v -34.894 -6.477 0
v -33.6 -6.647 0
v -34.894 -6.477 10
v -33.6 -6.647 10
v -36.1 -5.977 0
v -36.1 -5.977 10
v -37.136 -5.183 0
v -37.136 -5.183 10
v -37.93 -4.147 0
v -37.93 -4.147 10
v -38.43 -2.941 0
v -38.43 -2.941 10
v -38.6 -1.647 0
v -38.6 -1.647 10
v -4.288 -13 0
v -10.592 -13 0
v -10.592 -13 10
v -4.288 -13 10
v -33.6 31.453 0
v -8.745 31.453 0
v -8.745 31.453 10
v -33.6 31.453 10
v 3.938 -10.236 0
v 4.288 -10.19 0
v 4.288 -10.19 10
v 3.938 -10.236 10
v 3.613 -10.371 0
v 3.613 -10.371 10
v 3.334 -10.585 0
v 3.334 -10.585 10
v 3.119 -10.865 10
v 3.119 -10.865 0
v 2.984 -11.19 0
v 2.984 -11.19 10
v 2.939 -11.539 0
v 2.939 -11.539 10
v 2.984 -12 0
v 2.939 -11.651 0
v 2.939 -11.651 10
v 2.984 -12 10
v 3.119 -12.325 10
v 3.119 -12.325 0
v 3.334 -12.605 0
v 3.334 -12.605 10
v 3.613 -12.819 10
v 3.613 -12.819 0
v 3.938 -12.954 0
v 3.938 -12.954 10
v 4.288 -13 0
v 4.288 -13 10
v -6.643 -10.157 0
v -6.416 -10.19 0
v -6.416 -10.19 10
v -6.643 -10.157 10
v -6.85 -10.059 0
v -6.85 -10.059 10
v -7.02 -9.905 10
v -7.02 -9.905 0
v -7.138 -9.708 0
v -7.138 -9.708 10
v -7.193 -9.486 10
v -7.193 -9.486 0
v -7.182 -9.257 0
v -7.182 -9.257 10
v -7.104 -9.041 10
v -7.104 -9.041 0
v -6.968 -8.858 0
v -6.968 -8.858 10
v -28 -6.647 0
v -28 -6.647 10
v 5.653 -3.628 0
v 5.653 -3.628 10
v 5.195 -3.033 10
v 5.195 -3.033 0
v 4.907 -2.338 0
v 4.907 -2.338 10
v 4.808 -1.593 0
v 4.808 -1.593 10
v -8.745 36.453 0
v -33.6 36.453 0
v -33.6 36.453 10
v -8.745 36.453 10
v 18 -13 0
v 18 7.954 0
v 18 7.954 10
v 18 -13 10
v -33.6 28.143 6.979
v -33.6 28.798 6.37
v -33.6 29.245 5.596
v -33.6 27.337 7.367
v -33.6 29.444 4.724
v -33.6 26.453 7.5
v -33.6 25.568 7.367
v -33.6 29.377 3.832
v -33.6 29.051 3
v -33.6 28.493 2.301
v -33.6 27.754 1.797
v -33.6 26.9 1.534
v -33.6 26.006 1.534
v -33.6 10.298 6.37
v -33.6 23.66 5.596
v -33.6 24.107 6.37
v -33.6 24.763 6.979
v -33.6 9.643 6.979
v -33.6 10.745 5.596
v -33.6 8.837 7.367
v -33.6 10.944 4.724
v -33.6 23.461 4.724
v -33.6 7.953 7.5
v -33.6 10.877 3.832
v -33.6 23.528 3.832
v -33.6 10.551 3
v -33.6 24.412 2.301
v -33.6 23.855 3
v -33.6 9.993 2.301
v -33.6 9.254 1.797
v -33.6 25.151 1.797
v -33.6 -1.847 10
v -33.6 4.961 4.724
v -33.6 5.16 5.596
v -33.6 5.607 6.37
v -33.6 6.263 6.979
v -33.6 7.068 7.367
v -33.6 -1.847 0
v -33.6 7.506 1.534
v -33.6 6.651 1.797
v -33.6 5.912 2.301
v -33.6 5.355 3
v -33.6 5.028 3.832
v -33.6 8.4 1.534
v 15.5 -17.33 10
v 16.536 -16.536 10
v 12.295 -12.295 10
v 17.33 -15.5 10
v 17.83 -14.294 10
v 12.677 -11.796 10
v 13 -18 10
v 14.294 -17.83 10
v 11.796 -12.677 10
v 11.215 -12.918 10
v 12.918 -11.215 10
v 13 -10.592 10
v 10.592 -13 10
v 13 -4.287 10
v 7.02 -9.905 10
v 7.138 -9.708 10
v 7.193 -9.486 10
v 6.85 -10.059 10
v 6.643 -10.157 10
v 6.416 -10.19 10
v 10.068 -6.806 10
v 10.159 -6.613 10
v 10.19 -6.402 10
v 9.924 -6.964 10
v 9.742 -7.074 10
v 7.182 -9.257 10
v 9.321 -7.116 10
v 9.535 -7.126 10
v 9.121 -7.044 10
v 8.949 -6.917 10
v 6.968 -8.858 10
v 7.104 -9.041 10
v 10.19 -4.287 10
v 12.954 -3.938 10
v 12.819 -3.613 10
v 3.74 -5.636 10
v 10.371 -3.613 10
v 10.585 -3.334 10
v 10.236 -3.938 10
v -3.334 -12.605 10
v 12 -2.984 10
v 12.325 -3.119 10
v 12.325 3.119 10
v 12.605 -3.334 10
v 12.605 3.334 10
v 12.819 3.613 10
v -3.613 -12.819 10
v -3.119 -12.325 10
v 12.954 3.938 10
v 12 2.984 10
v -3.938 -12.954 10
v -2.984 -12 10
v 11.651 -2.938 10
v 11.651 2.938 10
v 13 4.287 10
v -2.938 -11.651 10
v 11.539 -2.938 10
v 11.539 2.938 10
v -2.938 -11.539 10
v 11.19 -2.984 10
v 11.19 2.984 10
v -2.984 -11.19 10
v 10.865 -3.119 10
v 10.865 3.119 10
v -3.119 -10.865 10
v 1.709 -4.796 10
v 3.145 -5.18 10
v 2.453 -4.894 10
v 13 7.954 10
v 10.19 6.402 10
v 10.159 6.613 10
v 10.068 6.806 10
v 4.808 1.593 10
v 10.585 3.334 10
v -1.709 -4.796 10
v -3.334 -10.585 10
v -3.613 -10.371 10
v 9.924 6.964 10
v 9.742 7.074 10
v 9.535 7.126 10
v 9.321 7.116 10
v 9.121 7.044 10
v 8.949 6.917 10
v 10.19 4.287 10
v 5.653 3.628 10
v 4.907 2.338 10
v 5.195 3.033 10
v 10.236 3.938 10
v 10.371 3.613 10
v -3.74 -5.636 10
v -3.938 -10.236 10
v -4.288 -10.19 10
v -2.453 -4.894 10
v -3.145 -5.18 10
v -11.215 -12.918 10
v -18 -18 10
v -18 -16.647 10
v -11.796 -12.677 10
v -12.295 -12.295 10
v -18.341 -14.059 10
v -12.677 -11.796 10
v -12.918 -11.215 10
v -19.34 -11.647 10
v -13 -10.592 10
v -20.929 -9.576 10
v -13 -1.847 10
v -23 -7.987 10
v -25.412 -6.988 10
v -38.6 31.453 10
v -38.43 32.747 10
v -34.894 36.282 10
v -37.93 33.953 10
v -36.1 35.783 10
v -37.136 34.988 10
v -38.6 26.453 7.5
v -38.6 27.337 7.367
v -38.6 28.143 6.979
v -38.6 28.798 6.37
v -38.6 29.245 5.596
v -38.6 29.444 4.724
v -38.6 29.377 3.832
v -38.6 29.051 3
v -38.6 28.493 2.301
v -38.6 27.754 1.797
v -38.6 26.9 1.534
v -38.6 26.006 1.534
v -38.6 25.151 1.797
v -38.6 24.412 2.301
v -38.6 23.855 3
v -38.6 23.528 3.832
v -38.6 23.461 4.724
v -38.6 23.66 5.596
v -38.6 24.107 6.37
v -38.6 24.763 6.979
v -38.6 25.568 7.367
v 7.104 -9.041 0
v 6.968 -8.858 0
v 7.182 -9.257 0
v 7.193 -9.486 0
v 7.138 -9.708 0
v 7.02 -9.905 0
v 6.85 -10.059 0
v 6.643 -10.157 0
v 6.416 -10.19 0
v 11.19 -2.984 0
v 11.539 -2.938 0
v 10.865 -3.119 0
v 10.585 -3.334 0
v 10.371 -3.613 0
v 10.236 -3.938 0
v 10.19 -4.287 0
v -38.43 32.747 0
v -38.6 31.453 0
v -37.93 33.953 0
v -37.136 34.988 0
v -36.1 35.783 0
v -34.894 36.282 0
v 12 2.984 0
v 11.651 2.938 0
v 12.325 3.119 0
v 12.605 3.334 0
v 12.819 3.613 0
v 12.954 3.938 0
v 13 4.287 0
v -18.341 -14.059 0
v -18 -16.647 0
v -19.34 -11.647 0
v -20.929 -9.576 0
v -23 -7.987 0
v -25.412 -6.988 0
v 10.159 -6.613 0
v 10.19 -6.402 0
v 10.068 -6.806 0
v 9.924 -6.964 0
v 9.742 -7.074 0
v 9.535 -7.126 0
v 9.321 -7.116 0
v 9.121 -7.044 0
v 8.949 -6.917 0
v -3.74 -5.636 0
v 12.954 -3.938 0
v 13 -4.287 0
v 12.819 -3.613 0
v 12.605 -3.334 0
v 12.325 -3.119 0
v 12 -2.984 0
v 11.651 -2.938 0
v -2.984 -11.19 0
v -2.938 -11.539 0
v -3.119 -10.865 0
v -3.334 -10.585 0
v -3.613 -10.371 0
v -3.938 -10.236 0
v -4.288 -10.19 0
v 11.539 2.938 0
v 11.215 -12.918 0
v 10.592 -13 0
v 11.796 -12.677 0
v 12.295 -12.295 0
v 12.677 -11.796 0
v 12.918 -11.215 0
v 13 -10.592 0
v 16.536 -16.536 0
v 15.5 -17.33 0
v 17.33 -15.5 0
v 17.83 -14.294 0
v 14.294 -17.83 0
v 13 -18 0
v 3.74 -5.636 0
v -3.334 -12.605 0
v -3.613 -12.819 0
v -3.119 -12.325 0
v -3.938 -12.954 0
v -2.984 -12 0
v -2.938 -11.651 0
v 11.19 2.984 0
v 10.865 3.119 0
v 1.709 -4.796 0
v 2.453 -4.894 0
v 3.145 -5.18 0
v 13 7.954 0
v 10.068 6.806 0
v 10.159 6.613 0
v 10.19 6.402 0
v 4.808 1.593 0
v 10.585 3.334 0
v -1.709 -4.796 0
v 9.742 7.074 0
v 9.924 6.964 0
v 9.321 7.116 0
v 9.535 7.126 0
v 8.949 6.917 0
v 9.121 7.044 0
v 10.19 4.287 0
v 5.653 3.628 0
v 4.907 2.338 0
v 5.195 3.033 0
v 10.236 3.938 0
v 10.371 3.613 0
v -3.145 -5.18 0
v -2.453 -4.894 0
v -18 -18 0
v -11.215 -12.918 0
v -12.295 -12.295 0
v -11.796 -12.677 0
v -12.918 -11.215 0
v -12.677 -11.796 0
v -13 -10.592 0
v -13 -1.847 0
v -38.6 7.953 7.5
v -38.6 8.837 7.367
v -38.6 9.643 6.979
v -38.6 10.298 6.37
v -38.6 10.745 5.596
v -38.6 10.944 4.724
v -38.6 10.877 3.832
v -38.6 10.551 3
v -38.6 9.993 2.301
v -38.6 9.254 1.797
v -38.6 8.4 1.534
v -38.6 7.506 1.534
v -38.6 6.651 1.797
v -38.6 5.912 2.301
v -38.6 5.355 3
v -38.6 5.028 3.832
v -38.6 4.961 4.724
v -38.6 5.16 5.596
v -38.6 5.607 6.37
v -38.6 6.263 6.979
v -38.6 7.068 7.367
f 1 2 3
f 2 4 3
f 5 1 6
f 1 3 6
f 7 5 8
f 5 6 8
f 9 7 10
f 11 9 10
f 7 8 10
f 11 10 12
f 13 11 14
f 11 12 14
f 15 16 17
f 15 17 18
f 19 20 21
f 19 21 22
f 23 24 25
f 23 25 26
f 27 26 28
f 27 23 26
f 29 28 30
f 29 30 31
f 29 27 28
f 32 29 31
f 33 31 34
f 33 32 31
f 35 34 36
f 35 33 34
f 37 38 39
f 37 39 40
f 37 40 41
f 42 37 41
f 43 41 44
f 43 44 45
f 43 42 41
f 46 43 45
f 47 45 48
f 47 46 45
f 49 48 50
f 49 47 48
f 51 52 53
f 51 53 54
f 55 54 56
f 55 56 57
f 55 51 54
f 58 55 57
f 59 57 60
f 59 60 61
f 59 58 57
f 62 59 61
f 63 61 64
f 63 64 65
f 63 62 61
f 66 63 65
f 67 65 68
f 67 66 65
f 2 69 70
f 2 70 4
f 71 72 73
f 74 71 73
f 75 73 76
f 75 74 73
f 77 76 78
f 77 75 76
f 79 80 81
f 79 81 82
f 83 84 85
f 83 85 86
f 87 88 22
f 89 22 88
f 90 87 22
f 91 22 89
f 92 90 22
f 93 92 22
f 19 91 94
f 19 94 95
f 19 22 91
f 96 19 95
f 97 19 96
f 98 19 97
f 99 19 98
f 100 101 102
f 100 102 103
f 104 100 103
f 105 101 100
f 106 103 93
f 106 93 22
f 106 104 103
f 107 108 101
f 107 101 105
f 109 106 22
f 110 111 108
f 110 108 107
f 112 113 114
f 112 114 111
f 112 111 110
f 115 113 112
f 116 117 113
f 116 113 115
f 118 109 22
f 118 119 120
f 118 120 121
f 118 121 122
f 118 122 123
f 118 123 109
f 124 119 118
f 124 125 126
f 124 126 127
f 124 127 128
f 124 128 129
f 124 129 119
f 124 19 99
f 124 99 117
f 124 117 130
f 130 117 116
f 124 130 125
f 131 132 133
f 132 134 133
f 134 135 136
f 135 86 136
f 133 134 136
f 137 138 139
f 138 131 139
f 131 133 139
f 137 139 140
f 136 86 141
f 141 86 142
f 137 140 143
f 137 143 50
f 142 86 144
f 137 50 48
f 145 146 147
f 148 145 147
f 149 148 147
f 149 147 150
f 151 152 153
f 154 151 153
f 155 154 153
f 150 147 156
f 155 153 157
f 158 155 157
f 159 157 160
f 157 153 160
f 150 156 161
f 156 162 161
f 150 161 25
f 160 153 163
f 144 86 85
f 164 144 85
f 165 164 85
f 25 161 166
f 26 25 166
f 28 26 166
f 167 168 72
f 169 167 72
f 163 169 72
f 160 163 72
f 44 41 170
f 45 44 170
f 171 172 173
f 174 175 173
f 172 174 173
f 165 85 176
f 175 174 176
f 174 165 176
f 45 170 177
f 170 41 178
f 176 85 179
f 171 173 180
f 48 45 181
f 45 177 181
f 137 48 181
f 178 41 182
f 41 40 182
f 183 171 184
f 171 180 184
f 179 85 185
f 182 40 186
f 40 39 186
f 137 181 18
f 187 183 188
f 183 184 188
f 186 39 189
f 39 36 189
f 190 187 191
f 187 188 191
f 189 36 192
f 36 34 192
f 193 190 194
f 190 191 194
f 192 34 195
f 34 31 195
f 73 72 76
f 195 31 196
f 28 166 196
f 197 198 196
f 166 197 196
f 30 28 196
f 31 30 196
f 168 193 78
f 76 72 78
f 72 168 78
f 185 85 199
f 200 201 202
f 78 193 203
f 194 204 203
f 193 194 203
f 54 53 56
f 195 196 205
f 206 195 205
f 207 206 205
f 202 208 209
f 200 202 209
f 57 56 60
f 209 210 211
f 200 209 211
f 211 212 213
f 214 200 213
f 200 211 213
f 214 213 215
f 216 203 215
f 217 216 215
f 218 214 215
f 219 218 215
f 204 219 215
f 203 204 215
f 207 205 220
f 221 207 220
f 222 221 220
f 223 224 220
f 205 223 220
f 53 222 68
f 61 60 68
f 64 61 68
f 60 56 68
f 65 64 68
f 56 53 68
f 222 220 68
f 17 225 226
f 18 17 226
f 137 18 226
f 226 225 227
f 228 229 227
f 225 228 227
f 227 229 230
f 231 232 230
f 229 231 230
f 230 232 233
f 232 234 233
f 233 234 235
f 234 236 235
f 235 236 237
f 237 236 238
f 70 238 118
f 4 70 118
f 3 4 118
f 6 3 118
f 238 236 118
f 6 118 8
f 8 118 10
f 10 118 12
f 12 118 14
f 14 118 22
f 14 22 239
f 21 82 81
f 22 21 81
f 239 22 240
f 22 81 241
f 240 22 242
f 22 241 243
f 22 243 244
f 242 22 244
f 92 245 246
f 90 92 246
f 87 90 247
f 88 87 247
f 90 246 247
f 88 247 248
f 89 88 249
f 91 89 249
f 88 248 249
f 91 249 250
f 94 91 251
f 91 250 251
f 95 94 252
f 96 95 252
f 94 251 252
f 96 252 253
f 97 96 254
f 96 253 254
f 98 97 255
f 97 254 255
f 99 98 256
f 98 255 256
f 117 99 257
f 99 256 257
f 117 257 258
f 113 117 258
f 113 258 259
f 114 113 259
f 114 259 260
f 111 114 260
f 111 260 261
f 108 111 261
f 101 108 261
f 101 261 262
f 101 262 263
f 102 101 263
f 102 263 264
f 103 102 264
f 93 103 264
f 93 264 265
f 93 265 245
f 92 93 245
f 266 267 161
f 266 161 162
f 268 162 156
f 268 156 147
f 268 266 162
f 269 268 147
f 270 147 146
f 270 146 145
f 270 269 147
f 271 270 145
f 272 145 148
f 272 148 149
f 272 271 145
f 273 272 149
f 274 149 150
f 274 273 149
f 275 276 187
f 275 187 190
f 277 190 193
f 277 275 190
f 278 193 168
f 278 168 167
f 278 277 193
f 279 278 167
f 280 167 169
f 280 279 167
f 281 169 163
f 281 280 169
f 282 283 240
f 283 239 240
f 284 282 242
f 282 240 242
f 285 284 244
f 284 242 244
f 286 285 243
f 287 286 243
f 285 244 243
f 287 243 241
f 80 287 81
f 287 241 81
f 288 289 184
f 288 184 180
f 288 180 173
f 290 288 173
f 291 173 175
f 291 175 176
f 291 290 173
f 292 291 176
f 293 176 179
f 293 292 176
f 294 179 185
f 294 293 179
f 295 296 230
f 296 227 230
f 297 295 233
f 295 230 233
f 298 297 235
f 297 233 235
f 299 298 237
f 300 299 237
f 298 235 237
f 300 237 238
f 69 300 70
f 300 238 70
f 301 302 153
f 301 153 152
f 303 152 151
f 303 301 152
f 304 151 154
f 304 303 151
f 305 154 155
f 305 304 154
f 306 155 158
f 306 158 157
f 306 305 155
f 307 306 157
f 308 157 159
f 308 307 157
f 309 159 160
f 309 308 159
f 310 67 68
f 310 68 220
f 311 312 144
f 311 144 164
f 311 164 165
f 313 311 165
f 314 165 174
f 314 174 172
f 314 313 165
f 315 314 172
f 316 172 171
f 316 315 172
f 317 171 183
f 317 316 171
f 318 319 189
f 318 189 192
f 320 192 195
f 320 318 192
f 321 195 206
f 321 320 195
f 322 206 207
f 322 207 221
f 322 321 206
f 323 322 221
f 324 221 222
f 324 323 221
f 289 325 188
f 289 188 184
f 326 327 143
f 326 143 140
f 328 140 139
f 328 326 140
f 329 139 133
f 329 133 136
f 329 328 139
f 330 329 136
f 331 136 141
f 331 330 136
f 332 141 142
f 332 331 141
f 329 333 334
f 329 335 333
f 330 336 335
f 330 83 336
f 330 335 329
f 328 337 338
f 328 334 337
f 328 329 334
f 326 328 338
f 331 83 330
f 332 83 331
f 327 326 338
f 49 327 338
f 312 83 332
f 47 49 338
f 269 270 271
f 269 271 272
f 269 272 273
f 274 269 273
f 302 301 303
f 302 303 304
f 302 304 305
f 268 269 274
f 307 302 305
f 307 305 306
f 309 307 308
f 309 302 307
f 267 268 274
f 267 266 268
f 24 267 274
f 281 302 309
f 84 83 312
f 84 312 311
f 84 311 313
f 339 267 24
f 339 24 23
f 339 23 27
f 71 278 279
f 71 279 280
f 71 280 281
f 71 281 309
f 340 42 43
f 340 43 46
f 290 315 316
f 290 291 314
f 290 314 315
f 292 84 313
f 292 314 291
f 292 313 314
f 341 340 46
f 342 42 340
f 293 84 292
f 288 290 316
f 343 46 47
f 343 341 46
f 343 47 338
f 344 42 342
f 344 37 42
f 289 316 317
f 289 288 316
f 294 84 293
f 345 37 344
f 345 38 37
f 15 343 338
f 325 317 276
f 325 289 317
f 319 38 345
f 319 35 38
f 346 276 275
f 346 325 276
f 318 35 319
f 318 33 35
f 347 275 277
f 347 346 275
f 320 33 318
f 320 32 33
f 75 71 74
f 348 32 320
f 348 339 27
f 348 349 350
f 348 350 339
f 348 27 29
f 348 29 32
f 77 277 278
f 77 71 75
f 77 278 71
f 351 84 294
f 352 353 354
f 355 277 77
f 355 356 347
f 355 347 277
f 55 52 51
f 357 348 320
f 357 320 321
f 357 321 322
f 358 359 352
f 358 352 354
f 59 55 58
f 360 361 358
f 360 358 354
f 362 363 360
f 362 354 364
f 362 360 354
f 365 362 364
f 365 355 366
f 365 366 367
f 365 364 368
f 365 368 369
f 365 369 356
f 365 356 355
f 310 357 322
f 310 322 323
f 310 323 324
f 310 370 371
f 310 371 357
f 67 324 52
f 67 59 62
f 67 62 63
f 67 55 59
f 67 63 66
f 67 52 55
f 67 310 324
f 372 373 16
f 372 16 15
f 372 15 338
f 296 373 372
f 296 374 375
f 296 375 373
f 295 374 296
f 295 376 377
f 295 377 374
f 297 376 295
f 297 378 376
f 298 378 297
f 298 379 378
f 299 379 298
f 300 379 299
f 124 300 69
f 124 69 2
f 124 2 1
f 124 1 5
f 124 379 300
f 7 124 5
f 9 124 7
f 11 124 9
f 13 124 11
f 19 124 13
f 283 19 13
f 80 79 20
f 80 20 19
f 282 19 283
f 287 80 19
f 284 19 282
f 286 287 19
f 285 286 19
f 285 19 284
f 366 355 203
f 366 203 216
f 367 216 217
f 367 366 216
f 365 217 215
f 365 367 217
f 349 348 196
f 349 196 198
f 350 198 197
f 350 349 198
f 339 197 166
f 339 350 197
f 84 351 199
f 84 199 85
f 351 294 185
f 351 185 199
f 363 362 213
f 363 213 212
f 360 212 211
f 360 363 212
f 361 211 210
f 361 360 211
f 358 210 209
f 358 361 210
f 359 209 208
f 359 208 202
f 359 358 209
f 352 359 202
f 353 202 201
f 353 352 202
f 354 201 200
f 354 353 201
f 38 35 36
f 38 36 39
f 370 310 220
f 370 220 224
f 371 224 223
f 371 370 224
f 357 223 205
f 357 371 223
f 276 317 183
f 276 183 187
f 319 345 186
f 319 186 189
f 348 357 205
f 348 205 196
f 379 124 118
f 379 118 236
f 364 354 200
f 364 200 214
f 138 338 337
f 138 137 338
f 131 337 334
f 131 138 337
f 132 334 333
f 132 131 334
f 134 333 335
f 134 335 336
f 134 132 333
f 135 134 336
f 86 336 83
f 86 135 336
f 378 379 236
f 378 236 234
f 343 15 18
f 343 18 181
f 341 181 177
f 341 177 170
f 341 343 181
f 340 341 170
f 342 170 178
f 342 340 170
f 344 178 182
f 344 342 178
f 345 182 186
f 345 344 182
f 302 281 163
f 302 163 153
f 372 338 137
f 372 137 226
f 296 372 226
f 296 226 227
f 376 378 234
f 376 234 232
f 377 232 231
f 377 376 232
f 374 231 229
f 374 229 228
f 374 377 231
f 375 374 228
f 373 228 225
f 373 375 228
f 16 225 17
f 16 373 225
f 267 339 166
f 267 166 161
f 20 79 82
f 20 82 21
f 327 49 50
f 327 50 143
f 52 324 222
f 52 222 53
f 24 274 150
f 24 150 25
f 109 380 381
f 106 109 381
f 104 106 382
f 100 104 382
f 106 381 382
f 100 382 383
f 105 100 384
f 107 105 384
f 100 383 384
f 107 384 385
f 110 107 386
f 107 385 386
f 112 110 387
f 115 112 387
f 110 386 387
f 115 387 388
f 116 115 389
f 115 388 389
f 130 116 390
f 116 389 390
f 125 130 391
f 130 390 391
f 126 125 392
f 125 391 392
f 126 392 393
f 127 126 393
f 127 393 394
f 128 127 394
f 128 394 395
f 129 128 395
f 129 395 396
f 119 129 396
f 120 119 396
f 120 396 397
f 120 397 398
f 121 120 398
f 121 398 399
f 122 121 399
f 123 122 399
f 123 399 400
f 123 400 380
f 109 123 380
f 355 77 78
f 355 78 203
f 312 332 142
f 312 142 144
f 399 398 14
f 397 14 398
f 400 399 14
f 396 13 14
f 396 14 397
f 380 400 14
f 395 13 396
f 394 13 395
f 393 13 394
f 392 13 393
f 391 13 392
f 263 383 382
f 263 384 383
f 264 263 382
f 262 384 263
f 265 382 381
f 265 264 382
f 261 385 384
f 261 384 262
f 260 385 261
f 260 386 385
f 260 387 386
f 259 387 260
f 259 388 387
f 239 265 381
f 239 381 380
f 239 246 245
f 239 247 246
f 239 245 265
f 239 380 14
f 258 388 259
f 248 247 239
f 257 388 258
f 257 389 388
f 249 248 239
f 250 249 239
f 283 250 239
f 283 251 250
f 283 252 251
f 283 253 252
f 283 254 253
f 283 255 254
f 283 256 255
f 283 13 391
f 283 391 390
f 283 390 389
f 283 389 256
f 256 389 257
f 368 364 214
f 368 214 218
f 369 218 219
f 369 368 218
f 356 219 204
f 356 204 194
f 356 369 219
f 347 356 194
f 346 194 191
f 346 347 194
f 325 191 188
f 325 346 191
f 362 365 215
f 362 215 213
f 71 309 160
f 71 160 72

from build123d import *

# Parameters (mm, degrees)
BOSS_EXTRUDE1_DEPTH = 10
CUT_EXTRUDE1_REACH  = 70.061
SKETCH2_R           = 3
FILLET1_R           = 10
FILLET2_R           = 5


with BuildPart() as part:
    # Sketch1 → Boss-Extrude1 (new body)
    with BuildSketch(Plane.XY):
        with BuildLine():
            Line((-10.5918, -13), (-4.305880552, -13))
            Line((-4.305880552, -13), (-4.287512407, -13))
            ThreePointArc((-4.287512407, -13), (-3.333616586, -12.604883414), (-2.9385, -11.650987593))
            Line((-2.9385, -11.650987593), (-2.9385, -11.539212407))
            ThreePointArc((-2.9385, -11.539212407), (-3.333616586, -10.585316586), (-4.287512407, -10.1902))
            Line((-4.287512407, -10.1902), (-6.416408329, -10.1902))
            ThreePointArc((-6.416408329, -10.1902), (-7.137514675, -9.708134418), (-6.967711912, -8.857517813))
            Line((-6.967711912, -8.857517813), (-3.740331666, -5.636015806))
            ThreePointArc((-3.740331666, -5.636015806), (-2.808257752, -5.01414519), (-1.709253557, -4.7958))
            Line((-1.709253557, -4.7958), (1.709253557, -4.7958))
            ThreePointArc((1.709253557, -4.7958), (2.808257752, -5.01414519), (3.740331666, -5.636015806))
            Line((3.740331666, -5.636015806), (6.967711912, -8.857517813))
            ThreePointArc((6.967711912, -8.857517813), (7.137514675, -9.708134418), (6.416408329, -10.1902))
            Line((6.416408329, -10.1902), (4.287512407, -10.1902))
            ThreePointArc((4.287512407, -10.1902), (3.333616586, -10.585316586), (2.9385, -11.539212407))
            Line((2.9385, -11.539212407), (2.9385, -11.650987593))
            ThreePointArc((2.9385, -11.650987593), (3.333616586, -12.604883414), (4.287512407, -13))
            Line((4.287512407, -13), (5.321597603, -13))
            Line((5.321597603, -13), (10.5918, -13))
            ThreePointArc((10.5918, -13), (12.29465455, -12.29465455), (13, -10.5918))
            Line((13, -10.5918), (13, -5.3170836))
            Line((13, -5.3170836), (13, -4.287469289))
            ThreePointArc((13, -4.287469289), (12.604883414, -3.333573468), (11.650987593, -2.938456882))
            Line((11.650987593, -2.938456882), (11.539212407, -2.938456882))
            ThreePointArc((11.539212407, -2.938456882), (10.585316586, -3.333573468), (10.1902, -4.287469289))
            Line((10.1902, -4.287469289), (10.1902, -6.402089023))
            ThreePointArc((10.1902, -6.402089023), (9.74154152, -7.073969797), (8.94902056, -6.917034355))
            Line((8.94902056, -6.917034355), (5.652895046, -3.628441884))
            ThreePointArc((5.652895046, -3.628441884), (5.027976112, -2.694919539), (4.8085, -1.593185507))
            Line((4.8085, -1.593185507), (4.8085, 1.593185507))
            ThreePointArc((4.8085, 1.593185507), (5.027976112, 2.694919539), (5.652895046, 3.628441884))
            Line((5.652895046, 3.628441884), (8.94902056, 6.917034355))
            ThreePointArc((8.94902056, 6.917034355), (9.74154152, 7.073969797), (10.1902, 6.402089023))
            Line((10.1902, 6.402089023), (10.1902, 4.287469289))
            ThreePointArc((10.1902, 4.287469289), (10.585316586, 3.333573468), (11.539212407, 2.938456882))
            Line((11.539212407, 2.938456882), (11.650987593, 2.938456882))
            ThreePointArc((11.650987593, 2.938456882), (12.604883414, 3.333573468), (13, 4.287469289))
            Line((13, 4.287469289), (13, 5.3170836))
            Line((13, 5.3170836), (13, 7.9544418))
            Line((13, 7.9544418), (18, 7.9544418))
            Line((18, 7.9544418), (18, -18))
            Line((18, -18), (-18, -18))
            Line((-18, -18), (-18, -6.6473334))
            Line((-18, -6.6473334), (-38.6, -6.6473334))
            Line((-38.6, -6.6473334), (-38.6, 36.4526666))
            Line((-38.6, 36.4526666), (-8.745302284, 36.4526666))
            Line((-8.745302284, 36.4526666), (-8.745302284, 31.4526666))
            Line((-8.745302284, 31.4526666), (-33.6, 31.4526666))
            Line((-33.6, 31.4526666), (-33.6, -1.8473334))
            Line((-33.6, -1.8473334), (-13, -1.8473334))
            Line((-13, -1.8473334), (-13, -4.287469289))
            Line((-13, -4.287469289), (-13, -10.5918))
            ThreePointArc((-13, -10.5918), (-12.29465455, -12.29465455), (-10.5918, -13))
        make_face()
    extrude(amount=BOSS_EXTRUDE1_DEPTH)

    # Sketch2 → Cut-Extrude1 (cut, up to next)
    with BuildSketch(Plane.ZY.offset(38.6), mode=Mode.PRIVATE) as cut_extrude1_sk1:
        with Locations((4.5, 26.4526666)):
            Circle(SKETCH2_R)
    cut_extrude1_tool1 = extrude(cut_extrude1_sk1.sketch, amount=-CUT_EXTRUDE1_REACH, mode=Mode.PRIVATE) & part.part
    # Sketch2 → Cut-Extrude1 (cut, up to next)
    with BuildSketch(Plane.ZY.offset(38.6), mode=Mode.PRIVATE) as cut_extrude1_sk2:
        with Locations((4.5, 7.9526666)):
            Circle(SKETCH2_R)
    cut_extrude1_tool2 = extrude(cut_extrude1_sk2.sketch, amount=-CUT_EXTRUDE1_REACH, mode=Mode.PRIVATE) & part.part
    add(cut_extrude1_tool1.solids().sort_by_distance((-38.6, 26.452667, 4.5))[0], mode=Mode.SUBTRACT)
    add(cut_extrude1_tool2.solids().sort_by_distance((-38.6, 7.952667, 4.5))[0], mode=Mode.SUBTRACT)

    # Fillet1
    fillet1_edges = [part.edges().sort_by_distance(p)[0] for p in [
        (-18, -6.6473334, 5),
    ]]
    fillet(fillet1_edges, radius=FILLET1_R)

    # Fillet2
    fillet2_edges = [part.edges().sort_by_distance(p)[0] for p in [
        (18, -18, 5),
        (-38.6, -6.6473334, 5),
        (-38.6, 36.4526666, 5),
    ]]
    fillet(fillet2_edges, radius=FILLET2_R)


solid = part.part
